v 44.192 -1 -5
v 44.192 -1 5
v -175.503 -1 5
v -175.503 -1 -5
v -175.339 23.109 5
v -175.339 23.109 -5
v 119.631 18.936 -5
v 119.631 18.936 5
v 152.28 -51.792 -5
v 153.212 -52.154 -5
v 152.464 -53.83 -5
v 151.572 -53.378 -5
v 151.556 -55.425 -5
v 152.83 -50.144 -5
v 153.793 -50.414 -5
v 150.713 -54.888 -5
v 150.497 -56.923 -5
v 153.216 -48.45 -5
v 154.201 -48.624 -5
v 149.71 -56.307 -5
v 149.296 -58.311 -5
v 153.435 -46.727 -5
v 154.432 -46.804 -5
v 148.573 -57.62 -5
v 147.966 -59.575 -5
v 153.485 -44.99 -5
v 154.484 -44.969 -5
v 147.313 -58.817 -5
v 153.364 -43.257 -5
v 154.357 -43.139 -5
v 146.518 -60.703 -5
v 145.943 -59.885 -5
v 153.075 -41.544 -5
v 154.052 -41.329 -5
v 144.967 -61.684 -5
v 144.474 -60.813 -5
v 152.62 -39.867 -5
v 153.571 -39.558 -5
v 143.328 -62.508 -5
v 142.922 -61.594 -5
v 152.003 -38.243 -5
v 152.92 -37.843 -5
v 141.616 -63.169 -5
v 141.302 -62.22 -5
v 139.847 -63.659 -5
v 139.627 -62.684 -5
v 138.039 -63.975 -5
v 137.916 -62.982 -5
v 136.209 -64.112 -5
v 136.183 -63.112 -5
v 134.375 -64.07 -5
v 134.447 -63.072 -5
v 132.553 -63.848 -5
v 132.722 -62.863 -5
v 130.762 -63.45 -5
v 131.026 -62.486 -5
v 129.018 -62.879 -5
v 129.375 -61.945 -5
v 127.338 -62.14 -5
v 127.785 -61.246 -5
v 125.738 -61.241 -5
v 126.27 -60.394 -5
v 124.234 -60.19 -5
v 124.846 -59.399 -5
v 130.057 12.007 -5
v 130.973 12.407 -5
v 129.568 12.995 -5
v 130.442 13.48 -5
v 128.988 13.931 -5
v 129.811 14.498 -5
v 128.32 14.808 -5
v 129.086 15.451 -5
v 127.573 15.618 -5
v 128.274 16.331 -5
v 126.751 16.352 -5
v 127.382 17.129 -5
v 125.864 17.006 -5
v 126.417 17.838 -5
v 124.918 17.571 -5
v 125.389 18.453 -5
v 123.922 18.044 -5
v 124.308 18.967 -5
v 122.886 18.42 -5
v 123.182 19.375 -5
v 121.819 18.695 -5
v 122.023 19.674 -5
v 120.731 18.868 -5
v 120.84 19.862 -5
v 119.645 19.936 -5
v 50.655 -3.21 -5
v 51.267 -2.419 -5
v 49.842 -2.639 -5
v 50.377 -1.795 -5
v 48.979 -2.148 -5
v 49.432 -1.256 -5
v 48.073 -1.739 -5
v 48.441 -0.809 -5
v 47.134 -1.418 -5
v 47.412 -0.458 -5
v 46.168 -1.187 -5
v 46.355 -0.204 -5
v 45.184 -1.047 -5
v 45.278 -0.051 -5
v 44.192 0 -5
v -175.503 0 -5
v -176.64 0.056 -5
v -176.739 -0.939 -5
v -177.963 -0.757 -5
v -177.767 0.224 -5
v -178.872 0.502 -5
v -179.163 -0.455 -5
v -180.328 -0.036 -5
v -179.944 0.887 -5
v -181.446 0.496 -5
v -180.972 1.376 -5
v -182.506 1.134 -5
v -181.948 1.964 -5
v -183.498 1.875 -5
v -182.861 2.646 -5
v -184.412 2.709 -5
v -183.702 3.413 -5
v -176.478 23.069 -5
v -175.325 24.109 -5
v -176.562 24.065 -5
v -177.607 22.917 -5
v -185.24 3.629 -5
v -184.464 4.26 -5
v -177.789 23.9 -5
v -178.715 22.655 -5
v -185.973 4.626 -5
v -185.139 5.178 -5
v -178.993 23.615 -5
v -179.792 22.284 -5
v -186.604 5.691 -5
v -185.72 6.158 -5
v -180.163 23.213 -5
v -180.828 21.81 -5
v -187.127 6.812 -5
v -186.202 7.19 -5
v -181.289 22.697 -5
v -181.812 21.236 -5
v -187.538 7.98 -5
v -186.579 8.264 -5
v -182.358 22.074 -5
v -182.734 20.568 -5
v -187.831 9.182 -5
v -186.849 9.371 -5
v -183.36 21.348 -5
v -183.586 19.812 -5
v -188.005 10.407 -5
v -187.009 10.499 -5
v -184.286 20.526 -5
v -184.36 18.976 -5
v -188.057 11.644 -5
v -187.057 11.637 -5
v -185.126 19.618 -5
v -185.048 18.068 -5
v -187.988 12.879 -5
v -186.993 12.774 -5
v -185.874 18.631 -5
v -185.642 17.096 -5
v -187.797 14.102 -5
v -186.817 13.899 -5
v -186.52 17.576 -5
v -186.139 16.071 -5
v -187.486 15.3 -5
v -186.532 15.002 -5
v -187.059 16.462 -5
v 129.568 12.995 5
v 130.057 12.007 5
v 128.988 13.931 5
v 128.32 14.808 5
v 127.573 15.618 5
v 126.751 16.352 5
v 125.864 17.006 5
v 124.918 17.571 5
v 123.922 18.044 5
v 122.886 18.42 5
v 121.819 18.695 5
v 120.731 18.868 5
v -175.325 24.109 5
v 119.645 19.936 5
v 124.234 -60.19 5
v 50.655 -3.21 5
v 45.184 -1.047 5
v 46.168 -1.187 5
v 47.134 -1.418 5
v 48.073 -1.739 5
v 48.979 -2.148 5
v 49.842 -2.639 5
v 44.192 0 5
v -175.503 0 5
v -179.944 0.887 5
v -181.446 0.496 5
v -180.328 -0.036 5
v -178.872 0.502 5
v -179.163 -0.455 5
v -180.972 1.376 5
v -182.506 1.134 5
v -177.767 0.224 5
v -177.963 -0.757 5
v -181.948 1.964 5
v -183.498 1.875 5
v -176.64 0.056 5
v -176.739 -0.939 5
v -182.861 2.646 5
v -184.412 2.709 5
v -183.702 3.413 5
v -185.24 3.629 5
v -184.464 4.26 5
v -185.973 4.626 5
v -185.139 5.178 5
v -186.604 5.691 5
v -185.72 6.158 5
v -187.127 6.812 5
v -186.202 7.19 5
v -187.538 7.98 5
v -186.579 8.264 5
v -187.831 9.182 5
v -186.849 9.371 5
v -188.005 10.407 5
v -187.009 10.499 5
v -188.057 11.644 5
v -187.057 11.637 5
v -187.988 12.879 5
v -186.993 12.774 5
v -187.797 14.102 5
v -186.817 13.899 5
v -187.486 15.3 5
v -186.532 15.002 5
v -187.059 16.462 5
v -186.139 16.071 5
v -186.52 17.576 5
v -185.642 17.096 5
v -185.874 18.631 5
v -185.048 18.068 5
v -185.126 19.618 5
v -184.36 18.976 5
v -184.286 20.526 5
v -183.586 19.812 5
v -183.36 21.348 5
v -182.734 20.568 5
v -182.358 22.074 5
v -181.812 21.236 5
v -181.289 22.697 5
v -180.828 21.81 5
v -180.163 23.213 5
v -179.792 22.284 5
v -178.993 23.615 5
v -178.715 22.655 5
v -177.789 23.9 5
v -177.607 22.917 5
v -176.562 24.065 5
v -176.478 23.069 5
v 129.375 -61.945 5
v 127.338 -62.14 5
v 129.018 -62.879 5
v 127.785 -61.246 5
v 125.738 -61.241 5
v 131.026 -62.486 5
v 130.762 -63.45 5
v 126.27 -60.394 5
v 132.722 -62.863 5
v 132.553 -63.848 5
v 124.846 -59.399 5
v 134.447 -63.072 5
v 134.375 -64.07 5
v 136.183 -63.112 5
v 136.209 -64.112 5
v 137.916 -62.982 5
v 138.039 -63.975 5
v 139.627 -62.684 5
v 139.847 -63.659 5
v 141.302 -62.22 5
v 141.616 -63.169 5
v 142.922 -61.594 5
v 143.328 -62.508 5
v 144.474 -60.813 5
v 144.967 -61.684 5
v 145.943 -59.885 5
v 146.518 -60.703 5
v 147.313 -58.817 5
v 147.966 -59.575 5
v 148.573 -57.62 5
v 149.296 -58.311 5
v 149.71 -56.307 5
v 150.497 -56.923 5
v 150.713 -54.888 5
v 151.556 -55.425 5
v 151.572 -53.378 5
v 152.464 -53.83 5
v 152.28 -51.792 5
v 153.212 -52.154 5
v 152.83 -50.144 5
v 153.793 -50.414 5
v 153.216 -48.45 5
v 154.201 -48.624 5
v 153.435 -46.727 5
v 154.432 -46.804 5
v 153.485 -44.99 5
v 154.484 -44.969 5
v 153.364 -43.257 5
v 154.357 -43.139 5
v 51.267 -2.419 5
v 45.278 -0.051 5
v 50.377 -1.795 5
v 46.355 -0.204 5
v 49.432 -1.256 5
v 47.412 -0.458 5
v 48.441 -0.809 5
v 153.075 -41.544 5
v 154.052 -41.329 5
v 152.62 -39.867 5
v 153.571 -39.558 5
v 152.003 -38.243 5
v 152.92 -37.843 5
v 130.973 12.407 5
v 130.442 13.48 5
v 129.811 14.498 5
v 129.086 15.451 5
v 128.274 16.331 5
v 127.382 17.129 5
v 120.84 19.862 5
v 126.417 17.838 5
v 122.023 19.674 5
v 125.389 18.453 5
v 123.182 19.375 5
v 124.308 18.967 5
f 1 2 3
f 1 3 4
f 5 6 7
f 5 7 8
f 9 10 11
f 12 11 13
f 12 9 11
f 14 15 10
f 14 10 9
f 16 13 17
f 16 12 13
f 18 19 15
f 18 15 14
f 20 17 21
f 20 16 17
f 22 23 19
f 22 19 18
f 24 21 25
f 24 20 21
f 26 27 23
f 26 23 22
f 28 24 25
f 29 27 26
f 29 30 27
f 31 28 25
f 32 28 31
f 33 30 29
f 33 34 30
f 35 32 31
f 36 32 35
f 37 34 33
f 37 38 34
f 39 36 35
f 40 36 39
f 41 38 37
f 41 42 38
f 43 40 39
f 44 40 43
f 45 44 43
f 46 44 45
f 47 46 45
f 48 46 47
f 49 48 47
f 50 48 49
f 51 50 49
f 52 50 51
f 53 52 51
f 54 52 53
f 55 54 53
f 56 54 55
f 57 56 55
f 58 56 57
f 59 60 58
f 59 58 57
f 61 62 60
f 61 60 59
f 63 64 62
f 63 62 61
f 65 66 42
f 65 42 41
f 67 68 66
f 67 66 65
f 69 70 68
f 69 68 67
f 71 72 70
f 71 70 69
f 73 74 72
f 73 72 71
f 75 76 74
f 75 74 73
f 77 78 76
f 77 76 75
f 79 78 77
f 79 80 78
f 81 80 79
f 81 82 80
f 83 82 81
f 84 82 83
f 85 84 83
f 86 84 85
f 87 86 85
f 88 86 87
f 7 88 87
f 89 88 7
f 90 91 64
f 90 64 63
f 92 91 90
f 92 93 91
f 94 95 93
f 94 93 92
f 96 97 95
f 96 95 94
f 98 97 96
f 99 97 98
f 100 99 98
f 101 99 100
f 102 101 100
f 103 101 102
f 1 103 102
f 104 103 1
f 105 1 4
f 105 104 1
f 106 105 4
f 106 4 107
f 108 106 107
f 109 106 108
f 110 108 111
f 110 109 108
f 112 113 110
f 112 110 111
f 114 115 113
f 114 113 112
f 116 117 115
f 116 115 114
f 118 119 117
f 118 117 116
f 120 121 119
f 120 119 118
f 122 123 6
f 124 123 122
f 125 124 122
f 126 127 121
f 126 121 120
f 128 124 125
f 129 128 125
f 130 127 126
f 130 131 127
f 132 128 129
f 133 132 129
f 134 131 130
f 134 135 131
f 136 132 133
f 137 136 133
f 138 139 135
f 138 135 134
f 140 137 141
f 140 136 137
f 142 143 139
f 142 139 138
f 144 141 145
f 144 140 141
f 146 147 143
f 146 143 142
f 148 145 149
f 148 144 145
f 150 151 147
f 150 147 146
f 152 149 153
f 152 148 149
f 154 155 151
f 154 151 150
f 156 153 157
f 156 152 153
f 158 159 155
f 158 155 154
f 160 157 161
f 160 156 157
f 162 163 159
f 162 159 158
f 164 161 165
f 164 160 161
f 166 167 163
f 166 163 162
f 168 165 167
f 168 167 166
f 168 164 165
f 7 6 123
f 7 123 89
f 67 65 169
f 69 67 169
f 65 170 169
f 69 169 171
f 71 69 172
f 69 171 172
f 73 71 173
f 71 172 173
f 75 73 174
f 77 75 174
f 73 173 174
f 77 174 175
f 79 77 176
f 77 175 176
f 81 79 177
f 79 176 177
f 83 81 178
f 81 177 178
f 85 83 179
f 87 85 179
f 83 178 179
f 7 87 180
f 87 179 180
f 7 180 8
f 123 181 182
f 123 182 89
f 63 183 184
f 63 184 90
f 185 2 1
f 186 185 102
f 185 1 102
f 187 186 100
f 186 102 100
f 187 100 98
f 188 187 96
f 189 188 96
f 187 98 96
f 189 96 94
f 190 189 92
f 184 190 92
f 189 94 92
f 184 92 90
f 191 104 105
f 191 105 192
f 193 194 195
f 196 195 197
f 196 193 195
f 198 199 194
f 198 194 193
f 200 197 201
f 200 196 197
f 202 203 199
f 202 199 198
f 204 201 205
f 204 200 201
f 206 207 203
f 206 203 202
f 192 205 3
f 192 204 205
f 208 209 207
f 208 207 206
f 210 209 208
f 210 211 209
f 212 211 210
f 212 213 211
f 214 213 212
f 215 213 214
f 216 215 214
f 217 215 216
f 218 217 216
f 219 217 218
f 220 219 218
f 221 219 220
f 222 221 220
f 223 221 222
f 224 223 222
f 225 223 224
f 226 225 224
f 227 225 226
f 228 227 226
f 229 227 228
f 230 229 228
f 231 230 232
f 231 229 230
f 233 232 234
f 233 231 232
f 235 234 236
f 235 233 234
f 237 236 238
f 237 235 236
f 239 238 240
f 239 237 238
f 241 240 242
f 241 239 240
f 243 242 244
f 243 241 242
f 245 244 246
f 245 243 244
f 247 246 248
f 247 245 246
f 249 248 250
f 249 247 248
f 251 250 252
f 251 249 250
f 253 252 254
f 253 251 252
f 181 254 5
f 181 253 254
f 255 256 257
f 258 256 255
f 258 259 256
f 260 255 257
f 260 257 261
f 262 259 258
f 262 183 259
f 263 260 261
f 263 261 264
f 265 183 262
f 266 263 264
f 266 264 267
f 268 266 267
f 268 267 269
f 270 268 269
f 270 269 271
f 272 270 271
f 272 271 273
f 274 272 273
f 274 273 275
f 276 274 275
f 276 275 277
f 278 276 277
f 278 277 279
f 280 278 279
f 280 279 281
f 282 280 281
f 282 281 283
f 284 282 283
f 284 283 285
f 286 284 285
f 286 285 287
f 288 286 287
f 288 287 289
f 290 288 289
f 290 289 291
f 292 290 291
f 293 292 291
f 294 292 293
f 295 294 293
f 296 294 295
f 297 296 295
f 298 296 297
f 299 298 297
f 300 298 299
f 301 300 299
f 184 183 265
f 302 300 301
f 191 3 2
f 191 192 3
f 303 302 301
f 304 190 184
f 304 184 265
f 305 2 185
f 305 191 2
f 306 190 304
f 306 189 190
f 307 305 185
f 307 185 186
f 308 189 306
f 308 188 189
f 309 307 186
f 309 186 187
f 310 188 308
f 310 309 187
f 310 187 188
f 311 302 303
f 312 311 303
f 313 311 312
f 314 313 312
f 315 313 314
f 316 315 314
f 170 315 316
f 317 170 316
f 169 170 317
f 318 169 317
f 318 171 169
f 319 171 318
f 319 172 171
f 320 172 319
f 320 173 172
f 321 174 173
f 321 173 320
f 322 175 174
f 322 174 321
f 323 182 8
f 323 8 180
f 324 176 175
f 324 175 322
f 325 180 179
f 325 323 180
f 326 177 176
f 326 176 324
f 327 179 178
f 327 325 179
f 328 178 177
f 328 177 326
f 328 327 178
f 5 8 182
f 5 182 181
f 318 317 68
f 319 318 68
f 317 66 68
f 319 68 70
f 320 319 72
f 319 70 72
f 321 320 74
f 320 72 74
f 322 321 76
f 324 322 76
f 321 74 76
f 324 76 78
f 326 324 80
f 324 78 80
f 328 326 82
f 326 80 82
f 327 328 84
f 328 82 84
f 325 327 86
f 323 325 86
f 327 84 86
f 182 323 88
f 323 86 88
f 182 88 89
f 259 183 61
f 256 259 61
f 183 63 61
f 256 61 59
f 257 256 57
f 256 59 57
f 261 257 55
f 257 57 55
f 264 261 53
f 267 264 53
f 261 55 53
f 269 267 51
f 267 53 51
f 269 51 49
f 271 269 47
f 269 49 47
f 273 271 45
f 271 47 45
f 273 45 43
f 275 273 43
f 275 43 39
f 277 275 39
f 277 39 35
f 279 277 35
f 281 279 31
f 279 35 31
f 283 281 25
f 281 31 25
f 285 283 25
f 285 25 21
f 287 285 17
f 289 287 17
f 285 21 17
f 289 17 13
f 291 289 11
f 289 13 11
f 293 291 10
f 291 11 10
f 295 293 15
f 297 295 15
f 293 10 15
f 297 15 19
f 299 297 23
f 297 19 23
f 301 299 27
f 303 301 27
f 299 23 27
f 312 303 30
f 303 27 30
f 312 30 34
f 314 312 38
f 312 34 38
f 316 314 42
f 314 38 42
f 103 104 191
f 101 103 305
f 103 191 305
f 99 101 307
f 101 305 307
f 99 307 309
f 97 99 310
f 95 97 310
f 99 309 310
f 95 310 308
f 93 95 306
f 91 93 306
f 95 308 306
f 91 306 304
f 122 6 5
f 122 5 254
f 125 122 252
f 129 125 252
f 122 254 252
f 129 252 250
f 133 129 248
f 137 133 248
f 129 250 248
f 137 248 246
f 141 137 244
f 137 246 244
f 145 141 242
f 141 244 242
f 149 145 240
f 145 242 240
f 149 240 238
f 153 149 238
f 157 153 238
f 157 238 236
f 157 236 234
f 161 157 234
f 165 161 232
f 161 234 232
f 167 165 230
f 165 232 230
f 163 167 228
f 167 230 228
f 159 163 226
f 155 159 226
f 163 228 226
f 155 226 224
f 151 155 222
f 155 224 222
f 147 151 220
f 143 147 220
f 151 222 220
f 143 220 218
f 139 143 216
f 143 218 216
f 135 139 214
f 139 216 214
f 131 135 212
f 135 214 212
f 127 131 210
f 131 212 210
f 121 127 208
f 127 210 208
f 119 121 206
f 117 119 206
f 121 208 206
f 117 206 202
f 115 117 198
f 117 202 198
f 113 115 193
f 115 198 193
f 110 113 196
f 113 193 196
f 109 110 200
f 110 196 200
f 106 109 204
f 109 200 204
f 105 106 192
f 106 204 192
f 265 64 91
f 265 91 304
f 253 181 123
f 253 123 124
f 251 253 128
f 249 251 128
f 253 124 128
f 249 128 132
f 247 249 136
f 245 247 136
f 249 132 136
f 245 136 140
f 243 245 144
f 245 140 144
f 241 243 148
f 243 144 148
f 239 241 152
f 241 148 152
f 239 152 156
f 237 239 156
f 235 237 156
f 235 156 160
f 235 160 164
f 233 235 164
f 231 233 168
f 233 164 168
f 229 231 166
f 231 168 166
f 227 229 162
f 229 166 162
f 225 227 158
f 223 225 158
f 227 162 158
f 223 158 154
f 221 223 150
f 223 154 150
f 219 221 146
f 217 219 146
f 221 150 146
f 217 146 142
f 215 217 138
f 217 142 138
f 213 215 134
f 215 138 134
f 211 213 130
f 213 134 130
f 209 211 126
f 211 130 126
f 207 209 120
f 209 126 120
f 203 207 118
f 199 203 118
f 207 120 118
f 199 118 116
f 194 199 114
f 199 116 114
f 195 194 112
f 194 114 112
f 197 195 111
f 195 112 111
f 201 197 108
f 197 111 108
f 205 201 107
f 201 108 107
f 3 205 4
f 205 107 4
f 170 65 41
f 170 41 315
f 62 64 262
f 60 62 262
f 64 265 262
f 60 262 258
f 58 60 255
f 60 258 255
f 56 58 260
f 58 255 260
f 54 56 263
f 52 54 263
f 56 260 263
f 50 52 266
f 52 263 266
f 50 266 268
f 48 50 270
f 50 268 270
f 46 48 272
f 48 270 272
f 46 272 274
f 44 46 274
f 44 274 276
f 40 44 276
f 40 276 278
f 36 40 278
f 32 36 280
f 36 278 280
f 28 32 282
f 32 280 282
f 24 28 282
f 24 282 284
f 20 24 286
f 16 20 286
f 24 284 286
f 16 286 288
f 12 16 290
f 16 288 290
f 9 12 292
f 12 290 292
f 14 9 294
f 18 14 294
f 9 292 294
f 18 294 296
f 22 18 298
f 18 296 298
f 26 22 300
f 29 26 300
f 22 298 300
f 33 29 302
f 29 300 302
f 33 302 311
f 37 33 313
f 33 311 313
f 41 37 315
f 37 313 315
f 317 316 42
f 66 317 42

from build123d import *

# Parameters (mm, degrees)
SKETCH_4_W = 10
SKETCH_4_H = 1


with BuildPart() as part:
    # 掃出1: sweep along a path in 草圖2
    with BuildLine(Plane.XY) as sweep_1_path:
        Line((152.003384949, -38.242833415), (130.05681925, 12.006884535))
        ThreePointArc((130.05681925, 12.006884535), (125.863591091, 17.005534481), (119.631157887, 18.935933413))
        Line((119.631157887, 18.935933413), (-175.339326769, 23.108843899))
        ThreePointArc((-175.339326769, 23.108843899), (-187.057488522, 11.636727435), (-175.502777551, 0))
        Line((-175.502777551, 0), (44.192301821, 0))
        ThreePointArc((44.192301821, 0), (47.930804214, -0.621490735), (51.267152631, -2.419108636))
        Line((51.267152631, -2.419108636), (124.846283962, -59.398921136))
        ThreePointArc((124.846283962, -59.398921136), (146.640920811, -59.367491082), (152.003384949, -38.242833415))
    # 草圖4 → 掃出1 (sweep)
    with BuildSketch(Plane(origin=(0, 0, 0), x_dir=(0, 0, -1), z_dir=(1, 0, 0))):
        with Locations((0, -0.5)):
            Rectangle(SKETCH_4_W, SKETCH_4_H)
    sweep(path=sweep_1_path.line)


solid = part.part
